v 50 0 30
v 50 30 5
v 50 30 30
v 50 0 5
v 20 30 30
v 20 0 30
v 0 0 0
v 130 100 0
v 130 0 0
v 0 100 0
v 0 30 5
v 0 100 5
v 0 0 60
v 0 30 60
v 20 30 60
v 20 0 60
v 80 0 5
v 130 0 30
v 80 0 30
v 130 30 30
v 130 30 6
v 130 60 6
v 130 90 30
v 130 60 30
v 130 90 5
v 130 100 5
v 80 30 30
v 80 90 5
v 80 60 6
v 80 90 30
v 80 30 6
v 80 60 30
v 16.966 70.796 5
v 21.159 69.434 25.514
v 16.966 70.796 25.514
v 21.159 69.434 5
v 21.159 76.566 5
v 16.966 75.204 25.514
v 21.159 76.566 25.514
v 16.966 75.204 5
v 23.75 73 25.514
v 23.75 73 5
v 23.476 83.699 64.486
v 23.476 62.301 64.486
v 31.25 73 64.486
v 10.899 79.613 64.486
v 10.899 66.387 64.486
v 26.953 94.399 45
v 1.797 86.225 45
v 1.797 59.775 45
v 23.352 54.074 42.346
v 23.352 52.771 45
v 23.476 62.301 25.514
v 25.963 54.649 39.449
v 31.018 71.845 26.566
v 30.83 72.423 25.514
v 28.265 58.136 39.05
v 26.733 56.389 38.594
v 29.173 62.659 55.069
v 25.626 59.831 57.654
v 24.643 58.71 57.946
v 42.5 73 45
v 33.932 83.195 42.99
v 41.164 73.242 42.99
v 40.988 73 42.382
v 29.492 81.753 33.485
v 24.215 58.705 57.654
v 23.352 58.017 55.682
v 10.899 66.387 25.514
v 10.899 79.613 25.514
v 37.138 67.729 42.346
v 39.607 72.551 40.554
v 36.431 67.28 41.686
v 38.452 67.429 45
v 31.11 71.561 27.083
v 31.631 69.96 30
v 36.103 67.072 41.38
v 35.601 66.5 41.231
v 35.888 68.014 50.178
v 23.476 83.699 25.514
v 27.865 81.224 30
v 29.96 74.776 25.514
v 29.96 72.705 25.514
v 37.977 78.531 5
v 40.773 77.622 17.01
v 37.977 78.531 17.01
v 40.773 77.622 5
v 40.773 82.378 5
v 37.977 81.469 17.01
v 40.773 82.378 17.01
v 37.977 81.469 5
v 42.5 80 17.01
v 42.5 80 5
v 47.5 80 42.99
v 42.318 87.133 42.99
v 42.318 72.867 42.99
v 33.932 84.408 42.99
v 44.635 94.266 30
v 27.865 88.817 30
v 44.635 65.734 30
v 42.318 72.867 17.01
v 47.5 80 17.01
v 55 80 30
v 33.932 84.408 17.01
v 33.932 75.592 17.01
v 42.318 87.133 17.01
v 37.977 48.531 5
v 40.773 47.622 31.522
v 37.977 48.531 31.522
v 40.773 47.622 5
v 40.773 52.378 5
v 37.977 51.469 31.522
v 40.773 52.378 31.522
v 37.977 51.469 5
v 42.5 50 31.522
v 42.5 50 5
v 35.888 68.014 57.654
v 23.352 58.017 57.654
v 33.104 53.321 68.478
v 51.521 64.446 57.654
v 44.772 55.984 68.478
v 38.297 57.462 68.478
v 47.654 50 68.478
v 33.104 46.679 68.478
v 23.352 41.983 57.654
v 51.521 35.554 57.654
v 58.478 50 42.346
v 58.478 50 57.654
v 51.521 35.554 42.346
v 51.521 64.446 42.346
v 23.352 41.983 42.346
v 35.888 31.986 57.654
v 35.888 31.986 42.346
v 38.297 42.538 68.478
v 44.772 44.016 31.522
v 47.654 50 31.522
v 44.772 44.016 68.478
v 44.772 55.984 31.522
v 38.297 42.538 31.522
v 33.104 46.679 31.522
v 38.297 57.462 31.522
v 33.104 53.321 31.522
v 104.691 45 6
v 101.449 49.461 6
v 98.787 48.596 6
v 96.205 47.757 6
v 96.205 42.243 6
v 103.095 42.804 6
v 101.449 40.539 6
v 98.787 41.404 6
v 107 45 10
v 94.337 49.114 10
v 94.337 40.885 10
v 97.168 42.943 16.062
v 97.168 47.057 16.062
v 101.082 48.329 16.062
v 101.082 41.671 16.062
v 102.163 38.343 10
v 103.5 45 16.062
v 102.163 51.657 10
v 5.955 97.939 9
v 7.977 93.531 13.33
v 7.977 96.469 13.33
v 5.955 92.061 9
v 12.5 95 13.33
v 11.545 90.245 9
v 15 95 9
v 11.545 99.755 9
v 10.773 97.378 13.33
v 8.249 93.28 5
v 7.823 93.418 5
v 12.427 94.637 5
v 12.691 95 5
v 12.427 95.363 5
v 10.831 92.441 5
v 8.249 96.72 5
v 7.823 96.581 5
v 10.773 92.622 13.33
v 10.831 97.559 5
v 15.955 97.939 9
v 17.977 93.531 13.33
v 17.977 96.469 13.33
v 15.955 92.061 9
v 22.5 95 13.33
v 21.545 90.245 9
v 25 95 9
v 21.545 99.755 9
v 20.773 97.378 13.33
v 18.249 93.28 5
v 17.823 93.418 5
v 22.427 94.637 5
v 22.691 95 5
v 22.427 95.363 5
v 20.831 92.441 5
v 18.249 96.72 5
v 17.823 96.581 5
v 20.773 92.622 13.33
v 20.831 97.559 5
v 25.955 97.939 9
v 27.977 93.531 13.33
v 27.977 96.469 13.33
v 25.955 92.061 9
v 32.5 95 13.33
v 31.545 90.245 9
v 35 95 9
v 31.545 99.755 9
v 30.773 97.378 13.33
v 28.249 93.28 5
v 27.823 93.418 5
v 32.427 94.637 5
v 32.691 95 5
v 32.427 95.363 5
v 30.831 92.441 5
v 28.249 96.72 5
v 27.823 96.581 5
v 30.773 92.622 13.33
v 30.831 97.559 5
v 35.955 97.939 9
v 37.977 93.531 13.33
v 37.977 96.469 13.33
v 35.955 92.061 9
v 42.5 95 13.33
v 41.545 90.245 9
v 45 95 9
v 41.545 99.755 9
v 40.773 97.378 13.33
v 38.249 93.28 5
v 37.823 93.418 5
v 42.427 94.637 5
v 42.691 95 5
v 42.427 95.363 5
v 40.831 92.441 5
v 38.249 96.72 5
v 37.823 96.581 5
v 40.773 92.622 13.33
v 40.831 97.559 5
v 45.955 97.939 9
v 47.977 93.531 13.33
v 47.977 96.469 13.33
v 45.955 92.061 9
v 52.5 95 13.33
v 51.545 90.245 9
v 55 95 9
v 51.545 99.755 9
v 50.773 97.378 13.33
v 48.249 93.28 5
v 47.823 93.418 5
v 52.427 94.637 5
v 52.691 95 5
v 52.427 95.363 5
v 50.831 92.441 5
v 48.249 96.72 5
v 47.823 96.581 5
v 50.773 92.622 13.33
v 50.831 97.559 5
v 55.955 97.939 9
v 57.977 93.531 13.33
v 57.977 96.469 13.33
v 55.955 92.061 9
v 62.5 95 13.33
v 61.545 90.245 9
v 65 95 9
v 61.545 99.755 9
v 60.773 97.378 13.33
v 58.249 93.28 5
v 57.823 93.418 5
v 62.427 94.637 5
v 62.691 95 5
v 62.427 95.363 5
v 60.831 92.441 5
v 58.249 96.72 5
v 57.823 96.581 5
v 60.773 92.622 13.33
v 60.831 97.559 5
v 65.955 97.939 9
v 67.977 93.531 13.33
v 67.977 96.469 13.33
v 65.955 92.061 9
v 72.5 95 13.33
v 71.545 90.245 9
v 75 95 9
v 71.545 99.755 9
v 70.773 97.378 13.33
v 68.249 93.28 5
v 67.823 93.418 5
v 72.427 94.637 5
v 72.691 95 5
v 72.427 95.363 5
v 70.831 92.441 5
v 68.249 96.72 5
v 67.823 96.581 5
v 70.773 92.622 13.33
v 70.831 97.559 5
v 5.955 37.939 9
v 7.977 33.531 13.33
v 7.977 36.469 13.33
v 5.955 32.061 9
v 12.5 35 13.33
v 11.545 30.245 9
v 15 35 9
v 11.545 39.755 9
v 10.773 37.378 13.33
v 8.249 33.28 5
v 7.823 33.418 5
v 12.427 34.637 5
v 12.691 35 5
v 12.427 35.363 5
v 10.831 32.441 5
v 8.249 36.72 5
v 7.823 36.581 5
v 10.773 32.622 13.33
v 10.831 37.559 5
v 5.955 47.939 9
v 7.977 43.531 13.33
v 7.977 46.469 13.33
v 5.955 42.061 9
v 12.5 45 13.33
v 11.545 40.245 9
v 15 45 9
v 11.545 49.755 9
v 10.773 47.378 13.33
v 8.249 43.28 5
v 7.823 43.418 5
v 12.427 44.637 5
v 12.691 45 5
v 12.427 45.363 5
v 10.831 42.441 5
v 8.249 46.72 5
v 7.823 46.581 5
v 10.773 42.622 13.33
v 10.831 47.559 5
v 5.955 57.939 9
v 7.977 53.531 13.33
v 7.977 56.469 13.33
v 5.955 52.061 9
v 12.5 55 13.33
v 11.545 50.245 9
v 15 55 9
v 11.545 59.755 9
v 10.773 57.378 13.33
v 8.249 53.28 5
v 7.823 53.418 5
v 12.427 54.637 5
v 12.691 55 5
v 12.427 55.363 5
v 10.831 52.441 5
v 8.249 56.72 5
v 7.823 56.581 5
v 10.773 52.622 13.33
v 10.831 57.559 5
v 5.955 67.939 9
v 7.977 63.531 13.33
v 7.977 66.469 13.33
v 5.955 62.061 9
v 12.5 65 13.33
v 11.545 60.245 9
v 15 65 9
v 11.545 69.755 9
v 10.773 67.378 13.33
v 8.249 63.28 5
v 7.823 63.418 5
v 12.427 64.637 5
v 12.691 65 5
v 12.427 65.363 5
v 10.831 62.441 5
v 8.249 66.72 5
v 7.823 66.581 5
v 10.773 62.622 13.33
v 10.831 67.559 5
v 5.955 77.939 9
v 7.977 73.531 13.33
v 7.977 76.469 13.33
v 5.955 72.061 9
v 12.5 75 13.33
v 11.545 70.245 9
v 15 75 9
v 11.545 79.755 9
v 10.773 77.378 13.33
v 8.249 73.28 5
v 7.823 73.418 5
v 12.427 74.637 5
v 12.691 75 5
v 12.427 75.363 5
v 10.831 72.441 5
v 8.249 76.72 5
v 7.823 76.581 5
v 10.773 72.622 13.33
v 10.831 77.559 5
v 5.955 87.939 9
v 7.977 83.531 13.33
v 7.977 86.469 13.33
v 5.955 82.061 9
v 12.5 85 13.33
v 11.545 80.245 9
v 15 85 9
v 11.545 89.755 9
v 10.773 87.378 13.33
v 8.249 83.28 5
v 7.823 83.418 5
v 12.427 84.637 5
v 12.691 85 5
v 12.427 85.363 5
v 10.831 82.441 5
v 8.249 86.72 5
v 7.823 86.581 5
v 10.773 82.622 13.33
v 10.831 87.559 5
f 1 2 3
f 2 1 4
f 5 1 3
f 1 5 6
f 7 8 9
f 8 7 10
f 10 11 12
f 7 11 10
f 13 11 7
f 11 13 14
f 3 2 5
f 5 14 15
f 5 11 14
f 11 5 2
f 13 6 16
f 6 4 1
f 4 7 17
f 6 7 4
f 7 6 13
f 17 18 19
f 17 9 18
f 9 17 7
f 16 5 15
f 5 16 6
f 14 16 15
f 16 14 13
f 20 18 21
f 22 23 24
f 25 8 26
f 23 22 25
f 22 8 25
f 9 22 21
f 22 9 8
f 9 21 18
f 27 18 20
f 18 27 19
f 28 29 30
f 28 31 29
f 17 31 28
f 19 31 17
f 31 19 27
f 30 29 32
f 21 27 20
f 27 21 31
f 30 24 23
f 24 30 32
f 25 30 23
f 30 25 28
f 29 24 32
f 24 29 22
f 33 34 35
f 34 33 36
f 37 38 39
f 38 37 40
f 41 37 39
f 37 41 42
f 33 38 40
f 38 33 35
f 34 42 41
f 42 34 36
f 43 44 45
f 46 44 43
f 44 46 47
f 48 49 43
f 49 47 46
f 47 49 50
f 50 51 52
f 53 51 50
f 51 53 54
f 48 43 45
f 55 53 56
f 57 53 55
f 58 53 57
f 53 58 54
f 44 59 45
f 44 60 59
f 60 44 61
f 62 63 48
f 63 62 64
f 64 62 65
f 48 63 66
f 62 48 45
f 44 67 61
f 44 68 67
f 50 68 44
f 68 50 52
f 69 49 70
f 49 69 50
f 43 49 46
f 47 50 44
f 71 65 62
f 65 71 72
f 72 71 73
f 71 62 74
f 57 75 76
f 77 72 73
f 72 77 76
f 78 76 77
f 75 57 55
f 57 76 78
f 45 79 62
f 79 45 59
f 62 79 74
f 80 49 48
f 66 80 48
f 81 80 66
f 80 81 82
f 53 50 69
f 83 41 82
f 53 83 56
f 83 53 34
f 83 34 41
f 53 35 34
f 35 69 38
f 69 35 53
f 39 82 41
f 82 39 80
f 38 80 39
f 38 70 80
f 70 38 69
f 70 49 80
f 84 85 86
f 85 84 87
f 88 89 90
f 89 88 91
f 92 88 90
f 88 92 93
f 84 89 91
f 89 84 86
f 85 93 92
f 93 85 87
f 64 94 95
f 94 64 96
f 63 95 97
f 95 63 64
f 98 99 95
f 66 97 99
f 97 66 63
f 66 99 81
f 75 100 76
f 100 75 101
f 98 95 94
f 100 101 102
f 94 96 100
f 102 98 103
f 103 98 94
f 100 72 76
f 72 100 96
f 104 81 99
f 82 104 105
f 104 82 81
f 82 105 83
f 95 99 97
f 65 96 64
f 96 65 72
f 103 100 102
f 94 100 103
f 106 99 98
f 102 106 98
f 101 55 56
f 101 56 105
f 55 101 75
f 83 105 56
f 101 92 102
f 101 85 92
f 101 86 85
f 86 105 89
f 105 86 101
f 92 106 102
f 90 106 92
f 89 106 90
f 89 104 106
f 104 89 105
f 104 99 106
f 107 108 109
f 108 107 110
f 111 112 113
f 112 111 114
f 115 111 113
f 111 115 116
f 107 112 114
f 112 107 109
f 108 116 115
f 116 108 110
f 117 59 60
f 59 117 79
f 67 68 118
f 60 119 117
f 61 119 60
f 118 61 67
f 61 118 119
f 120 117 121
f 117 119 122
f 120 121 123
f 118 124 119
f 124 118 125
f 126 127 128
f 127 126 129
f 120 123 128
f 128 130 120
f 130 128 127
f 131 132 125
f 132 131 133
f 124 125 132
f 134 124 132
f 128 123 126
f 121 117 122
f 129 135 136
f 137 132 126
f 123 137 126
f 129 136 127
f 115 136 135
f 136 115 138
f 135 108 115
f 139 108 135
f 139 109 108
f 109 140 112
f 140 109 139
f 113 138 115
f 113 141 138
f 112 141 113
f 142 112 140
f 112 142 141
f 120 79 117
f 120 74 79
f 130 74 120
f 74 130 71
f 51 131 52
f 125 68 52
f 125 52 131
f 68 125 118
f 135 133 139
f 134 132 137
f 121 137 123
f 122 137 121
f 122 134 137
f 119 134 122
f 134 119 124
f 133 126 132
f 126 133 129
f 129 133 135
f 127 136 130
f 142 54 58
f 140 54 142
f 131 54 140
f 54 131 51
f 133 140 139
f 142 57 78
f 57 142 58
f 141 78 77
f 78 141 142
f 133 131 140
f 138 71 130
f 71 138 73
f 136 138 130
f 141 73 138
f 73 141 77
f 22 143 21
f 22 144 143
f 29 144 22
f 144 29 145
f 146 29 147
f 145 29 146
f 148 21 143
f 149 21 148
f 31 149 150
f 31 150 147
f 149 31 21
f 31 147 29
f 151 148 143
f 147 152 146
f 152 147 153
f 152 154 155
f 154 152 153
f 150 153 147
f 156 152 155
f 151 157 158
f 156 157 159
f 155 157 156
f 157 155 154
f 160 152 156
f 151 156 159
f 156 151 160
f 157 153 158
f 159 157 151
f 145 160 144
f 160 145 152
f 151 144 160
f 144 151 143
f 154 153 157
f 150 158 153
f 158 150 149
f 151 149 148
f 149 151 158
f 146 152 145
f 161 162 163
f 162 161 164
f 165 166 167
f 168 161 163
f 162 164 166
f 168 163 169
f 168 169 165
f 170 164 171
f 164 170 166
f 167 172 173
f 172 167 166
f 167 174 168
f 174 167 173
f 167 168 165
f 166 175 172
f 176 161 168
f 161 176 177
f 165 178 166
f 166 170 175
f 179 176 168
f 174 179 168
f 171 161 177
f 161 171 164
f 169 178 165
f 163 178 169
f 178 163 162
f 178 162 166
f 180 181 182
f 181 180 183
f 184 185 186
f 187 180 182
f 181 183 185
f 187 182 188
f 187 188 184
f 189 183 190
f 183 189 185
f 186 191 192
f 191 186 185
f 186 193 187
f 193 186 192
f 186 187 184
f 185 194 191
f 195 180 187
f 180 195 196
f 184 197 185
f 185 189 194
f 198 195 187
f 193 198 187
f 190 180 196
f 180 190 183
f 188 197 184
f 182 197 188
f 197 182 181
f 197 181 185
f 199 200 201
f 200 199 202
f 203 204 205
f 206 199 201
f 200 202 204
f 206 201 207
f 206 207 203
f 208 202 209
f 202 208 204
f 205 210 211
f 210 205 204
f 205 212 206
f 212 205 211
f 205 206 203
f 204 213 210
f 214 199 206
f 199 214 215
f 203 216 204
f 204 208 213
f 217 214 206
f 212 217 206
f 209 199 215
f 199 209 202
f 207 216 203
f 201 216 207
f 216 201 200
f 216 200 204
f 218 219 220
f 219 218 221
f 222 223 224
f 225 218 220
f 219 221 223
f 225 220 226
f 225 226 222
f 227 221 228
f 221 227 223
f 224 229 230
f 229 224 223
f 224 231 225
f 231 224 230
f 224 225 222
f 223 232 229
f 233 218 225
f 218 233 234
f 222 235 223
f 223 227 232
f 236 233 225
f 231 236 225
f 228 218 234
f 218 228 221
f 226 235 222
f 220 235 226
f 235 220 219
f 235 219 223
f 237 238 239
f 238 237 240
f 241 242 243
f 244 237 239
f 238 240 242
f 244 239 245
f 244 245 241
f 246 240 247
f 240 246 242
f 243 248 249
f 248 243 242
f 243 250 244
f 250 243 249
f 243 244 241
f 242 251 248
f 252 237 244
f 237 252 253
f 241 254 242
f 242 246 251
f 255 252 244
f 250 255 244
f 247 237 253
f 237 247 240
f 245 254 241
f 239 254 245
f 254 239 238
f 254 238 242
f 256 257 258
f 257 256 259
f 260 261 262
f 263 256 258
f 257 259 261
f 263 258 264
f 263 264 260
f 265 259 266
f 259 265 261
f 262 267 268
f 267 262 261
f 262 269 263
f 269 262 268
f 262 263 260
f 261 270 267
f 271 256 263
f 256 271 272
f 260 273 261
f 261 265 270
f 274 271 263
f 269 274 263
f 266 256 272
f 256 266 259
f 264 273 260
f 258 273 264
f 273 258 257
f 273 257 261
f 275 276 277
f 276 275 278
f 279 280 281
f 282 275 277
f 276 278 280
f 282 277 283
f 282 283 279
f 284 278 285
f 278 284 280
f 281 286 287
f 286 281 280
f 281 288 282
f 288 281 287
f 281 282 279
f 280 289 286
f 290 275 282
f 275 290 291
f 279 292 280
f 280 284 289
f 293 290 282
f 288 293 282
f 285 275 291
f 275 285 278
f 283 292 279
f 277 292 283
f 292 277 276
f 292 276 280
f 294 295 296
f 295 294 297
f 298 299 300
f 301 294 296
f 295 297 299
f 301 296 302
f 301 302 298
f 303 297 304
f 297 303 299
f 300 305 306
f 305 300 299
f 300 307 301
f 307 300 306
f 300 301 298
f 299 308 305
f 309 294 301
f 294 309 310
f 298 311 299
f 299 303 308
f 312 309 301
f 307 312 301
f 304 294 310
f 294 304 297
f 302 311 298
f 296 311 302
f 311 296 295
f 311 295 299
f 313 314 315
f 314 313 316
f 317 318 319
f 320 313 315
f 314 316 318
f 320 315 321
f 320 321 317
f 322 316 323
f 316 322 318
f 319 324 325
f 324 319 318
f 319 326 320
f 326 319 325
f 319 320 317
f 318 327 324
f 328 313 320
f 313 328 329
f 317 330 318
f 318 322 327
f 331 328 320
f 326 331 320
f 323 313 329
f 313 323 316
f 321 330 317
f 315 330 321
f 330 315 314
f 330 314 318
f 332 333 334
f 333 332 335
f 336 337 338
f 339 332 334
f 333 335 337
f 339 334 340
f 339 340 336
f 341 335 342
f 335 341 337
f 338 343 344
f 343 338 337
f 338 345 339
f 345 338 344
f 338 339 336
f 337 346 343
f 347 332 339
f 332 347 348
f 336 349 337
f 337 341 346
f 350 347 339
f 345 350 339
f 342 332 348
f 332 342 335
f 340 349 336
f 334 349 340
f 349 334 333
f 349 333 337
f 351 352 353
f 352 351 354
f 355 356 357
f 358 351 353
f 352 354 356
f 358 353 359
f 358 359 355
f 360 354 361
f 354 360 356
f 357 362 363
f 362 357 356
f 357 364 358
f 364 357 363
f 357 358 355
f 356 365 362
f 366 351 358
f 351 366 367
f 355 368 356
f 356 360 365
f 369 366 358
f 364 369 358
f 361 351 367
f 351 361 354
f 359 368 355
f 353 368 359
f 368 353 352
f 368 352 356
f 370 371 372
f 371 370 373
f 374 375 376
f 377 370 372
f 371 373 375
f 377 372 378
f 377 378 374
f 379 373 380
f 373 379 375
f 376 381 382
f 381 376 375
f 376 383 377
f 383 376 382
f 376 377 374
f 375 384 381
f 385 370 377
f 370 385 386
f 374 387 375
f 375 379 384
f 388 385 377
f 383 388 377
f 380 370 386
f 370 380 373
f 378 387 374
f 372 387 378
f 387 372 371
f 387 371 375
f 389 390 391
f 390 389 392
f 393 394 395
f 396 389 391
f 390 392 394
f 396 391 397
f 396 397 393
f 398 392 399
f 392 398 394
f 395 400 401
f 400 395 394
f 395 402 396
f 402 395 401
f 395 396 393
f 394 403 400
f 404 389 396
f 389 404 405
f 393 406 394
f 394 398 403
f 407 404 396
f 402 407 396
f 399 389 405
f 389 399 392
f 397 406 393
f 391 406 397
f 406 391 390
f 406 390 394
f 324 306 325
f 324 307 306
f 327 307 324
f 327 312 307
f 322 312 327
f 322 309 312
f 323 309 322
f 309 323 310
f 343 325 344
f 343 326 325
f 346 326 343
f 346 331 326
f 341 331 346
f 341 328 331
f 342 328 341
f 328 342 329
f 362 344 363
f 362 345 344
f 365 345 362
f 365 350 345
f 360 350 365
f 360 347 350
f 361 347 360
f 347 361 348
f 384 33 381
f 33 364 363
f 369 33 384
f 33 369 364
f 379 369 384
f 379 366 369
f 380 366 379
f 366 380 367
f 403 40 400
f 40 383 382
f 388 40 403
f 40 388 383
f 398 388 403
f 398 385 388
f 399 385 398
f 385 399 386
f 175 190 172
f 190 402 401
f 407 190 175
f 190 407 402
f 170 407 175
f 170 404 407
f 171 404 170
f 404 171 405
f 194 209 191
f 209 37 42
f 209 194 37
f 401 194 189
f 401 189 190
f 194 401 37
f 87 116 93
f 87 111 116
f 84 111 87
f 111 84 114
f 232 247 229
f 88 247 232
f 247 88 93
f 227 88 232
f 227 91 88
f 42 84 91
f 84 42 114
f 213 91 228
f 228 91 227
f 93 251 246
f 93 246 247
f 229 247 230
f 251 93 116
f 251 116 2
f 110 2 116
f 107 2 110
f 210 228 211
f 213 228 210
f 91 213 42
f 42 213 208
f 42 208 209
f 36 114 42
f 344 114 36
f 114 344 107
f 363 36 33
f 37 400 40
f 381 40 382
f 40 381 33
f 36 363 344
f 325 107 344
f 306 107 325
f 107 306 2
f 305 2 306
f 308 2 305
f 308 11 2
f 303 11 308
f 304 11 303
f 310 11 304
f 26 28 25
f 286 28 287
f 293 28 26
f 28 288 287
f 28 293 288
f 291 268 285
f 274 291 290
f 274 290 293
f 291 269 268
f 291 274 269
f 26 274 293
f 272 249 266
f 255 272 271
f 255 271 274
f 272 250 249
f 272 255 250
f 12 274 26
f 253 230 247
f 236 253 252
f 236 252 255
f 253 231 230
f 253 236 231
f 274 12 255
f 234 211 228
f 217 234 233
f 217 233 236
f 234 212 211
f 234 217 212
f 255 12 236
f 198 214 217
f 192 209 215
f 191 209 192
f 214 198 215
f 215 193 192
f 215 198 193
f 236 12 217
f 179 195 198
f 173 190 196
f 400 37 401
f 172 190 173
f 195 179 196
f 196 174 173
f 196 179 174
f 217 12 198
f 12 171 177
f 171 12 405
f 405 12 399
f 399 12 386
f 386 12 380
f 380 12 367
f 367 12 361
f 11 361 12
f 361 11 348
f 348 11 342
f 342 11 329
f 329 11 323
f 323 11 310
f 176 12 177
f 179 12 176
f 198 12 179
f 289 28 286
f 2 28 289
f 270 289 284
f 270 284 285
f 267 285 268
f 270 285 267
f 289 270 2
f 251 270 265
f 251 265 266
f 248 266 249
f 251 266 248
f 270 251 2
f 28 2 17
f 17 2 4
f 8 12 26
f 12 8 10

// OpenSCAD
module maison1()
{
union() {color("beige") cube([5,3,3]);
translate([0,0,3]) color("red") polyhedron([
    [0,0,0],
    [5,0,0],
    [5,3,0],
    [0,3,0],
    [5-0.1,1.5,2],
    [0+0.1,1.5,2]],[
    [0,1,4,5],
    [2,3,5,4],
    [1,2,4],
    [0,5,3]]);
}
}
module eglise()
{
union()
{
    color("beige") cube([2,3,6]);
    maison1();
    translate([0,0,6]) color("red") polyhedron([
        [0,0,0],
        [2,0,0],
        [2,3,0],
        [0,3,0],
        [1,1.5,2]],[
        [0,1,4],
        [1,2,4],
        [2,3,4],
        [3,0,4]]);
}
}

module arbre(tronc=3,feuillage=1.5)
{
    color("brown") cylinder(h=tronc,d=0.5);
    translate([0,0,tronc]) color("green") sphere(feuillage);
}
module socle() cube([13,10,0.5]);

scale(10) union() {
    color("brown") socle();
    eglise();
    translate([8,0,0]) maison1();
    translate([8,6,0]) maison1();
    translate([2,7.3,0]) scale([1.5,1.5,1.5]) arbre();
    translate([4,8,0]) arbre();
    //translate([2.5,5.5,0]) arbre();
    //translate([4,5,0]){ cylinder(h=5,d=1); translate([0,0,5]) sphere(2);}
    translate([4,5,0]) arbre(tronc=5,feuillage=2);
    translate([8,3,0]) color("green"){
        cube([5,3,0.6]); 
        translate([2,1.5,1]) sphere(0.7);
    }
    color("green") for(x=[1:7]) translate([x,9.5,0.9]) sphere(0.5);
    color("green") for(y=[0:5]) translate([1,y+3.5,0.9]) sphere(0.5);
}
